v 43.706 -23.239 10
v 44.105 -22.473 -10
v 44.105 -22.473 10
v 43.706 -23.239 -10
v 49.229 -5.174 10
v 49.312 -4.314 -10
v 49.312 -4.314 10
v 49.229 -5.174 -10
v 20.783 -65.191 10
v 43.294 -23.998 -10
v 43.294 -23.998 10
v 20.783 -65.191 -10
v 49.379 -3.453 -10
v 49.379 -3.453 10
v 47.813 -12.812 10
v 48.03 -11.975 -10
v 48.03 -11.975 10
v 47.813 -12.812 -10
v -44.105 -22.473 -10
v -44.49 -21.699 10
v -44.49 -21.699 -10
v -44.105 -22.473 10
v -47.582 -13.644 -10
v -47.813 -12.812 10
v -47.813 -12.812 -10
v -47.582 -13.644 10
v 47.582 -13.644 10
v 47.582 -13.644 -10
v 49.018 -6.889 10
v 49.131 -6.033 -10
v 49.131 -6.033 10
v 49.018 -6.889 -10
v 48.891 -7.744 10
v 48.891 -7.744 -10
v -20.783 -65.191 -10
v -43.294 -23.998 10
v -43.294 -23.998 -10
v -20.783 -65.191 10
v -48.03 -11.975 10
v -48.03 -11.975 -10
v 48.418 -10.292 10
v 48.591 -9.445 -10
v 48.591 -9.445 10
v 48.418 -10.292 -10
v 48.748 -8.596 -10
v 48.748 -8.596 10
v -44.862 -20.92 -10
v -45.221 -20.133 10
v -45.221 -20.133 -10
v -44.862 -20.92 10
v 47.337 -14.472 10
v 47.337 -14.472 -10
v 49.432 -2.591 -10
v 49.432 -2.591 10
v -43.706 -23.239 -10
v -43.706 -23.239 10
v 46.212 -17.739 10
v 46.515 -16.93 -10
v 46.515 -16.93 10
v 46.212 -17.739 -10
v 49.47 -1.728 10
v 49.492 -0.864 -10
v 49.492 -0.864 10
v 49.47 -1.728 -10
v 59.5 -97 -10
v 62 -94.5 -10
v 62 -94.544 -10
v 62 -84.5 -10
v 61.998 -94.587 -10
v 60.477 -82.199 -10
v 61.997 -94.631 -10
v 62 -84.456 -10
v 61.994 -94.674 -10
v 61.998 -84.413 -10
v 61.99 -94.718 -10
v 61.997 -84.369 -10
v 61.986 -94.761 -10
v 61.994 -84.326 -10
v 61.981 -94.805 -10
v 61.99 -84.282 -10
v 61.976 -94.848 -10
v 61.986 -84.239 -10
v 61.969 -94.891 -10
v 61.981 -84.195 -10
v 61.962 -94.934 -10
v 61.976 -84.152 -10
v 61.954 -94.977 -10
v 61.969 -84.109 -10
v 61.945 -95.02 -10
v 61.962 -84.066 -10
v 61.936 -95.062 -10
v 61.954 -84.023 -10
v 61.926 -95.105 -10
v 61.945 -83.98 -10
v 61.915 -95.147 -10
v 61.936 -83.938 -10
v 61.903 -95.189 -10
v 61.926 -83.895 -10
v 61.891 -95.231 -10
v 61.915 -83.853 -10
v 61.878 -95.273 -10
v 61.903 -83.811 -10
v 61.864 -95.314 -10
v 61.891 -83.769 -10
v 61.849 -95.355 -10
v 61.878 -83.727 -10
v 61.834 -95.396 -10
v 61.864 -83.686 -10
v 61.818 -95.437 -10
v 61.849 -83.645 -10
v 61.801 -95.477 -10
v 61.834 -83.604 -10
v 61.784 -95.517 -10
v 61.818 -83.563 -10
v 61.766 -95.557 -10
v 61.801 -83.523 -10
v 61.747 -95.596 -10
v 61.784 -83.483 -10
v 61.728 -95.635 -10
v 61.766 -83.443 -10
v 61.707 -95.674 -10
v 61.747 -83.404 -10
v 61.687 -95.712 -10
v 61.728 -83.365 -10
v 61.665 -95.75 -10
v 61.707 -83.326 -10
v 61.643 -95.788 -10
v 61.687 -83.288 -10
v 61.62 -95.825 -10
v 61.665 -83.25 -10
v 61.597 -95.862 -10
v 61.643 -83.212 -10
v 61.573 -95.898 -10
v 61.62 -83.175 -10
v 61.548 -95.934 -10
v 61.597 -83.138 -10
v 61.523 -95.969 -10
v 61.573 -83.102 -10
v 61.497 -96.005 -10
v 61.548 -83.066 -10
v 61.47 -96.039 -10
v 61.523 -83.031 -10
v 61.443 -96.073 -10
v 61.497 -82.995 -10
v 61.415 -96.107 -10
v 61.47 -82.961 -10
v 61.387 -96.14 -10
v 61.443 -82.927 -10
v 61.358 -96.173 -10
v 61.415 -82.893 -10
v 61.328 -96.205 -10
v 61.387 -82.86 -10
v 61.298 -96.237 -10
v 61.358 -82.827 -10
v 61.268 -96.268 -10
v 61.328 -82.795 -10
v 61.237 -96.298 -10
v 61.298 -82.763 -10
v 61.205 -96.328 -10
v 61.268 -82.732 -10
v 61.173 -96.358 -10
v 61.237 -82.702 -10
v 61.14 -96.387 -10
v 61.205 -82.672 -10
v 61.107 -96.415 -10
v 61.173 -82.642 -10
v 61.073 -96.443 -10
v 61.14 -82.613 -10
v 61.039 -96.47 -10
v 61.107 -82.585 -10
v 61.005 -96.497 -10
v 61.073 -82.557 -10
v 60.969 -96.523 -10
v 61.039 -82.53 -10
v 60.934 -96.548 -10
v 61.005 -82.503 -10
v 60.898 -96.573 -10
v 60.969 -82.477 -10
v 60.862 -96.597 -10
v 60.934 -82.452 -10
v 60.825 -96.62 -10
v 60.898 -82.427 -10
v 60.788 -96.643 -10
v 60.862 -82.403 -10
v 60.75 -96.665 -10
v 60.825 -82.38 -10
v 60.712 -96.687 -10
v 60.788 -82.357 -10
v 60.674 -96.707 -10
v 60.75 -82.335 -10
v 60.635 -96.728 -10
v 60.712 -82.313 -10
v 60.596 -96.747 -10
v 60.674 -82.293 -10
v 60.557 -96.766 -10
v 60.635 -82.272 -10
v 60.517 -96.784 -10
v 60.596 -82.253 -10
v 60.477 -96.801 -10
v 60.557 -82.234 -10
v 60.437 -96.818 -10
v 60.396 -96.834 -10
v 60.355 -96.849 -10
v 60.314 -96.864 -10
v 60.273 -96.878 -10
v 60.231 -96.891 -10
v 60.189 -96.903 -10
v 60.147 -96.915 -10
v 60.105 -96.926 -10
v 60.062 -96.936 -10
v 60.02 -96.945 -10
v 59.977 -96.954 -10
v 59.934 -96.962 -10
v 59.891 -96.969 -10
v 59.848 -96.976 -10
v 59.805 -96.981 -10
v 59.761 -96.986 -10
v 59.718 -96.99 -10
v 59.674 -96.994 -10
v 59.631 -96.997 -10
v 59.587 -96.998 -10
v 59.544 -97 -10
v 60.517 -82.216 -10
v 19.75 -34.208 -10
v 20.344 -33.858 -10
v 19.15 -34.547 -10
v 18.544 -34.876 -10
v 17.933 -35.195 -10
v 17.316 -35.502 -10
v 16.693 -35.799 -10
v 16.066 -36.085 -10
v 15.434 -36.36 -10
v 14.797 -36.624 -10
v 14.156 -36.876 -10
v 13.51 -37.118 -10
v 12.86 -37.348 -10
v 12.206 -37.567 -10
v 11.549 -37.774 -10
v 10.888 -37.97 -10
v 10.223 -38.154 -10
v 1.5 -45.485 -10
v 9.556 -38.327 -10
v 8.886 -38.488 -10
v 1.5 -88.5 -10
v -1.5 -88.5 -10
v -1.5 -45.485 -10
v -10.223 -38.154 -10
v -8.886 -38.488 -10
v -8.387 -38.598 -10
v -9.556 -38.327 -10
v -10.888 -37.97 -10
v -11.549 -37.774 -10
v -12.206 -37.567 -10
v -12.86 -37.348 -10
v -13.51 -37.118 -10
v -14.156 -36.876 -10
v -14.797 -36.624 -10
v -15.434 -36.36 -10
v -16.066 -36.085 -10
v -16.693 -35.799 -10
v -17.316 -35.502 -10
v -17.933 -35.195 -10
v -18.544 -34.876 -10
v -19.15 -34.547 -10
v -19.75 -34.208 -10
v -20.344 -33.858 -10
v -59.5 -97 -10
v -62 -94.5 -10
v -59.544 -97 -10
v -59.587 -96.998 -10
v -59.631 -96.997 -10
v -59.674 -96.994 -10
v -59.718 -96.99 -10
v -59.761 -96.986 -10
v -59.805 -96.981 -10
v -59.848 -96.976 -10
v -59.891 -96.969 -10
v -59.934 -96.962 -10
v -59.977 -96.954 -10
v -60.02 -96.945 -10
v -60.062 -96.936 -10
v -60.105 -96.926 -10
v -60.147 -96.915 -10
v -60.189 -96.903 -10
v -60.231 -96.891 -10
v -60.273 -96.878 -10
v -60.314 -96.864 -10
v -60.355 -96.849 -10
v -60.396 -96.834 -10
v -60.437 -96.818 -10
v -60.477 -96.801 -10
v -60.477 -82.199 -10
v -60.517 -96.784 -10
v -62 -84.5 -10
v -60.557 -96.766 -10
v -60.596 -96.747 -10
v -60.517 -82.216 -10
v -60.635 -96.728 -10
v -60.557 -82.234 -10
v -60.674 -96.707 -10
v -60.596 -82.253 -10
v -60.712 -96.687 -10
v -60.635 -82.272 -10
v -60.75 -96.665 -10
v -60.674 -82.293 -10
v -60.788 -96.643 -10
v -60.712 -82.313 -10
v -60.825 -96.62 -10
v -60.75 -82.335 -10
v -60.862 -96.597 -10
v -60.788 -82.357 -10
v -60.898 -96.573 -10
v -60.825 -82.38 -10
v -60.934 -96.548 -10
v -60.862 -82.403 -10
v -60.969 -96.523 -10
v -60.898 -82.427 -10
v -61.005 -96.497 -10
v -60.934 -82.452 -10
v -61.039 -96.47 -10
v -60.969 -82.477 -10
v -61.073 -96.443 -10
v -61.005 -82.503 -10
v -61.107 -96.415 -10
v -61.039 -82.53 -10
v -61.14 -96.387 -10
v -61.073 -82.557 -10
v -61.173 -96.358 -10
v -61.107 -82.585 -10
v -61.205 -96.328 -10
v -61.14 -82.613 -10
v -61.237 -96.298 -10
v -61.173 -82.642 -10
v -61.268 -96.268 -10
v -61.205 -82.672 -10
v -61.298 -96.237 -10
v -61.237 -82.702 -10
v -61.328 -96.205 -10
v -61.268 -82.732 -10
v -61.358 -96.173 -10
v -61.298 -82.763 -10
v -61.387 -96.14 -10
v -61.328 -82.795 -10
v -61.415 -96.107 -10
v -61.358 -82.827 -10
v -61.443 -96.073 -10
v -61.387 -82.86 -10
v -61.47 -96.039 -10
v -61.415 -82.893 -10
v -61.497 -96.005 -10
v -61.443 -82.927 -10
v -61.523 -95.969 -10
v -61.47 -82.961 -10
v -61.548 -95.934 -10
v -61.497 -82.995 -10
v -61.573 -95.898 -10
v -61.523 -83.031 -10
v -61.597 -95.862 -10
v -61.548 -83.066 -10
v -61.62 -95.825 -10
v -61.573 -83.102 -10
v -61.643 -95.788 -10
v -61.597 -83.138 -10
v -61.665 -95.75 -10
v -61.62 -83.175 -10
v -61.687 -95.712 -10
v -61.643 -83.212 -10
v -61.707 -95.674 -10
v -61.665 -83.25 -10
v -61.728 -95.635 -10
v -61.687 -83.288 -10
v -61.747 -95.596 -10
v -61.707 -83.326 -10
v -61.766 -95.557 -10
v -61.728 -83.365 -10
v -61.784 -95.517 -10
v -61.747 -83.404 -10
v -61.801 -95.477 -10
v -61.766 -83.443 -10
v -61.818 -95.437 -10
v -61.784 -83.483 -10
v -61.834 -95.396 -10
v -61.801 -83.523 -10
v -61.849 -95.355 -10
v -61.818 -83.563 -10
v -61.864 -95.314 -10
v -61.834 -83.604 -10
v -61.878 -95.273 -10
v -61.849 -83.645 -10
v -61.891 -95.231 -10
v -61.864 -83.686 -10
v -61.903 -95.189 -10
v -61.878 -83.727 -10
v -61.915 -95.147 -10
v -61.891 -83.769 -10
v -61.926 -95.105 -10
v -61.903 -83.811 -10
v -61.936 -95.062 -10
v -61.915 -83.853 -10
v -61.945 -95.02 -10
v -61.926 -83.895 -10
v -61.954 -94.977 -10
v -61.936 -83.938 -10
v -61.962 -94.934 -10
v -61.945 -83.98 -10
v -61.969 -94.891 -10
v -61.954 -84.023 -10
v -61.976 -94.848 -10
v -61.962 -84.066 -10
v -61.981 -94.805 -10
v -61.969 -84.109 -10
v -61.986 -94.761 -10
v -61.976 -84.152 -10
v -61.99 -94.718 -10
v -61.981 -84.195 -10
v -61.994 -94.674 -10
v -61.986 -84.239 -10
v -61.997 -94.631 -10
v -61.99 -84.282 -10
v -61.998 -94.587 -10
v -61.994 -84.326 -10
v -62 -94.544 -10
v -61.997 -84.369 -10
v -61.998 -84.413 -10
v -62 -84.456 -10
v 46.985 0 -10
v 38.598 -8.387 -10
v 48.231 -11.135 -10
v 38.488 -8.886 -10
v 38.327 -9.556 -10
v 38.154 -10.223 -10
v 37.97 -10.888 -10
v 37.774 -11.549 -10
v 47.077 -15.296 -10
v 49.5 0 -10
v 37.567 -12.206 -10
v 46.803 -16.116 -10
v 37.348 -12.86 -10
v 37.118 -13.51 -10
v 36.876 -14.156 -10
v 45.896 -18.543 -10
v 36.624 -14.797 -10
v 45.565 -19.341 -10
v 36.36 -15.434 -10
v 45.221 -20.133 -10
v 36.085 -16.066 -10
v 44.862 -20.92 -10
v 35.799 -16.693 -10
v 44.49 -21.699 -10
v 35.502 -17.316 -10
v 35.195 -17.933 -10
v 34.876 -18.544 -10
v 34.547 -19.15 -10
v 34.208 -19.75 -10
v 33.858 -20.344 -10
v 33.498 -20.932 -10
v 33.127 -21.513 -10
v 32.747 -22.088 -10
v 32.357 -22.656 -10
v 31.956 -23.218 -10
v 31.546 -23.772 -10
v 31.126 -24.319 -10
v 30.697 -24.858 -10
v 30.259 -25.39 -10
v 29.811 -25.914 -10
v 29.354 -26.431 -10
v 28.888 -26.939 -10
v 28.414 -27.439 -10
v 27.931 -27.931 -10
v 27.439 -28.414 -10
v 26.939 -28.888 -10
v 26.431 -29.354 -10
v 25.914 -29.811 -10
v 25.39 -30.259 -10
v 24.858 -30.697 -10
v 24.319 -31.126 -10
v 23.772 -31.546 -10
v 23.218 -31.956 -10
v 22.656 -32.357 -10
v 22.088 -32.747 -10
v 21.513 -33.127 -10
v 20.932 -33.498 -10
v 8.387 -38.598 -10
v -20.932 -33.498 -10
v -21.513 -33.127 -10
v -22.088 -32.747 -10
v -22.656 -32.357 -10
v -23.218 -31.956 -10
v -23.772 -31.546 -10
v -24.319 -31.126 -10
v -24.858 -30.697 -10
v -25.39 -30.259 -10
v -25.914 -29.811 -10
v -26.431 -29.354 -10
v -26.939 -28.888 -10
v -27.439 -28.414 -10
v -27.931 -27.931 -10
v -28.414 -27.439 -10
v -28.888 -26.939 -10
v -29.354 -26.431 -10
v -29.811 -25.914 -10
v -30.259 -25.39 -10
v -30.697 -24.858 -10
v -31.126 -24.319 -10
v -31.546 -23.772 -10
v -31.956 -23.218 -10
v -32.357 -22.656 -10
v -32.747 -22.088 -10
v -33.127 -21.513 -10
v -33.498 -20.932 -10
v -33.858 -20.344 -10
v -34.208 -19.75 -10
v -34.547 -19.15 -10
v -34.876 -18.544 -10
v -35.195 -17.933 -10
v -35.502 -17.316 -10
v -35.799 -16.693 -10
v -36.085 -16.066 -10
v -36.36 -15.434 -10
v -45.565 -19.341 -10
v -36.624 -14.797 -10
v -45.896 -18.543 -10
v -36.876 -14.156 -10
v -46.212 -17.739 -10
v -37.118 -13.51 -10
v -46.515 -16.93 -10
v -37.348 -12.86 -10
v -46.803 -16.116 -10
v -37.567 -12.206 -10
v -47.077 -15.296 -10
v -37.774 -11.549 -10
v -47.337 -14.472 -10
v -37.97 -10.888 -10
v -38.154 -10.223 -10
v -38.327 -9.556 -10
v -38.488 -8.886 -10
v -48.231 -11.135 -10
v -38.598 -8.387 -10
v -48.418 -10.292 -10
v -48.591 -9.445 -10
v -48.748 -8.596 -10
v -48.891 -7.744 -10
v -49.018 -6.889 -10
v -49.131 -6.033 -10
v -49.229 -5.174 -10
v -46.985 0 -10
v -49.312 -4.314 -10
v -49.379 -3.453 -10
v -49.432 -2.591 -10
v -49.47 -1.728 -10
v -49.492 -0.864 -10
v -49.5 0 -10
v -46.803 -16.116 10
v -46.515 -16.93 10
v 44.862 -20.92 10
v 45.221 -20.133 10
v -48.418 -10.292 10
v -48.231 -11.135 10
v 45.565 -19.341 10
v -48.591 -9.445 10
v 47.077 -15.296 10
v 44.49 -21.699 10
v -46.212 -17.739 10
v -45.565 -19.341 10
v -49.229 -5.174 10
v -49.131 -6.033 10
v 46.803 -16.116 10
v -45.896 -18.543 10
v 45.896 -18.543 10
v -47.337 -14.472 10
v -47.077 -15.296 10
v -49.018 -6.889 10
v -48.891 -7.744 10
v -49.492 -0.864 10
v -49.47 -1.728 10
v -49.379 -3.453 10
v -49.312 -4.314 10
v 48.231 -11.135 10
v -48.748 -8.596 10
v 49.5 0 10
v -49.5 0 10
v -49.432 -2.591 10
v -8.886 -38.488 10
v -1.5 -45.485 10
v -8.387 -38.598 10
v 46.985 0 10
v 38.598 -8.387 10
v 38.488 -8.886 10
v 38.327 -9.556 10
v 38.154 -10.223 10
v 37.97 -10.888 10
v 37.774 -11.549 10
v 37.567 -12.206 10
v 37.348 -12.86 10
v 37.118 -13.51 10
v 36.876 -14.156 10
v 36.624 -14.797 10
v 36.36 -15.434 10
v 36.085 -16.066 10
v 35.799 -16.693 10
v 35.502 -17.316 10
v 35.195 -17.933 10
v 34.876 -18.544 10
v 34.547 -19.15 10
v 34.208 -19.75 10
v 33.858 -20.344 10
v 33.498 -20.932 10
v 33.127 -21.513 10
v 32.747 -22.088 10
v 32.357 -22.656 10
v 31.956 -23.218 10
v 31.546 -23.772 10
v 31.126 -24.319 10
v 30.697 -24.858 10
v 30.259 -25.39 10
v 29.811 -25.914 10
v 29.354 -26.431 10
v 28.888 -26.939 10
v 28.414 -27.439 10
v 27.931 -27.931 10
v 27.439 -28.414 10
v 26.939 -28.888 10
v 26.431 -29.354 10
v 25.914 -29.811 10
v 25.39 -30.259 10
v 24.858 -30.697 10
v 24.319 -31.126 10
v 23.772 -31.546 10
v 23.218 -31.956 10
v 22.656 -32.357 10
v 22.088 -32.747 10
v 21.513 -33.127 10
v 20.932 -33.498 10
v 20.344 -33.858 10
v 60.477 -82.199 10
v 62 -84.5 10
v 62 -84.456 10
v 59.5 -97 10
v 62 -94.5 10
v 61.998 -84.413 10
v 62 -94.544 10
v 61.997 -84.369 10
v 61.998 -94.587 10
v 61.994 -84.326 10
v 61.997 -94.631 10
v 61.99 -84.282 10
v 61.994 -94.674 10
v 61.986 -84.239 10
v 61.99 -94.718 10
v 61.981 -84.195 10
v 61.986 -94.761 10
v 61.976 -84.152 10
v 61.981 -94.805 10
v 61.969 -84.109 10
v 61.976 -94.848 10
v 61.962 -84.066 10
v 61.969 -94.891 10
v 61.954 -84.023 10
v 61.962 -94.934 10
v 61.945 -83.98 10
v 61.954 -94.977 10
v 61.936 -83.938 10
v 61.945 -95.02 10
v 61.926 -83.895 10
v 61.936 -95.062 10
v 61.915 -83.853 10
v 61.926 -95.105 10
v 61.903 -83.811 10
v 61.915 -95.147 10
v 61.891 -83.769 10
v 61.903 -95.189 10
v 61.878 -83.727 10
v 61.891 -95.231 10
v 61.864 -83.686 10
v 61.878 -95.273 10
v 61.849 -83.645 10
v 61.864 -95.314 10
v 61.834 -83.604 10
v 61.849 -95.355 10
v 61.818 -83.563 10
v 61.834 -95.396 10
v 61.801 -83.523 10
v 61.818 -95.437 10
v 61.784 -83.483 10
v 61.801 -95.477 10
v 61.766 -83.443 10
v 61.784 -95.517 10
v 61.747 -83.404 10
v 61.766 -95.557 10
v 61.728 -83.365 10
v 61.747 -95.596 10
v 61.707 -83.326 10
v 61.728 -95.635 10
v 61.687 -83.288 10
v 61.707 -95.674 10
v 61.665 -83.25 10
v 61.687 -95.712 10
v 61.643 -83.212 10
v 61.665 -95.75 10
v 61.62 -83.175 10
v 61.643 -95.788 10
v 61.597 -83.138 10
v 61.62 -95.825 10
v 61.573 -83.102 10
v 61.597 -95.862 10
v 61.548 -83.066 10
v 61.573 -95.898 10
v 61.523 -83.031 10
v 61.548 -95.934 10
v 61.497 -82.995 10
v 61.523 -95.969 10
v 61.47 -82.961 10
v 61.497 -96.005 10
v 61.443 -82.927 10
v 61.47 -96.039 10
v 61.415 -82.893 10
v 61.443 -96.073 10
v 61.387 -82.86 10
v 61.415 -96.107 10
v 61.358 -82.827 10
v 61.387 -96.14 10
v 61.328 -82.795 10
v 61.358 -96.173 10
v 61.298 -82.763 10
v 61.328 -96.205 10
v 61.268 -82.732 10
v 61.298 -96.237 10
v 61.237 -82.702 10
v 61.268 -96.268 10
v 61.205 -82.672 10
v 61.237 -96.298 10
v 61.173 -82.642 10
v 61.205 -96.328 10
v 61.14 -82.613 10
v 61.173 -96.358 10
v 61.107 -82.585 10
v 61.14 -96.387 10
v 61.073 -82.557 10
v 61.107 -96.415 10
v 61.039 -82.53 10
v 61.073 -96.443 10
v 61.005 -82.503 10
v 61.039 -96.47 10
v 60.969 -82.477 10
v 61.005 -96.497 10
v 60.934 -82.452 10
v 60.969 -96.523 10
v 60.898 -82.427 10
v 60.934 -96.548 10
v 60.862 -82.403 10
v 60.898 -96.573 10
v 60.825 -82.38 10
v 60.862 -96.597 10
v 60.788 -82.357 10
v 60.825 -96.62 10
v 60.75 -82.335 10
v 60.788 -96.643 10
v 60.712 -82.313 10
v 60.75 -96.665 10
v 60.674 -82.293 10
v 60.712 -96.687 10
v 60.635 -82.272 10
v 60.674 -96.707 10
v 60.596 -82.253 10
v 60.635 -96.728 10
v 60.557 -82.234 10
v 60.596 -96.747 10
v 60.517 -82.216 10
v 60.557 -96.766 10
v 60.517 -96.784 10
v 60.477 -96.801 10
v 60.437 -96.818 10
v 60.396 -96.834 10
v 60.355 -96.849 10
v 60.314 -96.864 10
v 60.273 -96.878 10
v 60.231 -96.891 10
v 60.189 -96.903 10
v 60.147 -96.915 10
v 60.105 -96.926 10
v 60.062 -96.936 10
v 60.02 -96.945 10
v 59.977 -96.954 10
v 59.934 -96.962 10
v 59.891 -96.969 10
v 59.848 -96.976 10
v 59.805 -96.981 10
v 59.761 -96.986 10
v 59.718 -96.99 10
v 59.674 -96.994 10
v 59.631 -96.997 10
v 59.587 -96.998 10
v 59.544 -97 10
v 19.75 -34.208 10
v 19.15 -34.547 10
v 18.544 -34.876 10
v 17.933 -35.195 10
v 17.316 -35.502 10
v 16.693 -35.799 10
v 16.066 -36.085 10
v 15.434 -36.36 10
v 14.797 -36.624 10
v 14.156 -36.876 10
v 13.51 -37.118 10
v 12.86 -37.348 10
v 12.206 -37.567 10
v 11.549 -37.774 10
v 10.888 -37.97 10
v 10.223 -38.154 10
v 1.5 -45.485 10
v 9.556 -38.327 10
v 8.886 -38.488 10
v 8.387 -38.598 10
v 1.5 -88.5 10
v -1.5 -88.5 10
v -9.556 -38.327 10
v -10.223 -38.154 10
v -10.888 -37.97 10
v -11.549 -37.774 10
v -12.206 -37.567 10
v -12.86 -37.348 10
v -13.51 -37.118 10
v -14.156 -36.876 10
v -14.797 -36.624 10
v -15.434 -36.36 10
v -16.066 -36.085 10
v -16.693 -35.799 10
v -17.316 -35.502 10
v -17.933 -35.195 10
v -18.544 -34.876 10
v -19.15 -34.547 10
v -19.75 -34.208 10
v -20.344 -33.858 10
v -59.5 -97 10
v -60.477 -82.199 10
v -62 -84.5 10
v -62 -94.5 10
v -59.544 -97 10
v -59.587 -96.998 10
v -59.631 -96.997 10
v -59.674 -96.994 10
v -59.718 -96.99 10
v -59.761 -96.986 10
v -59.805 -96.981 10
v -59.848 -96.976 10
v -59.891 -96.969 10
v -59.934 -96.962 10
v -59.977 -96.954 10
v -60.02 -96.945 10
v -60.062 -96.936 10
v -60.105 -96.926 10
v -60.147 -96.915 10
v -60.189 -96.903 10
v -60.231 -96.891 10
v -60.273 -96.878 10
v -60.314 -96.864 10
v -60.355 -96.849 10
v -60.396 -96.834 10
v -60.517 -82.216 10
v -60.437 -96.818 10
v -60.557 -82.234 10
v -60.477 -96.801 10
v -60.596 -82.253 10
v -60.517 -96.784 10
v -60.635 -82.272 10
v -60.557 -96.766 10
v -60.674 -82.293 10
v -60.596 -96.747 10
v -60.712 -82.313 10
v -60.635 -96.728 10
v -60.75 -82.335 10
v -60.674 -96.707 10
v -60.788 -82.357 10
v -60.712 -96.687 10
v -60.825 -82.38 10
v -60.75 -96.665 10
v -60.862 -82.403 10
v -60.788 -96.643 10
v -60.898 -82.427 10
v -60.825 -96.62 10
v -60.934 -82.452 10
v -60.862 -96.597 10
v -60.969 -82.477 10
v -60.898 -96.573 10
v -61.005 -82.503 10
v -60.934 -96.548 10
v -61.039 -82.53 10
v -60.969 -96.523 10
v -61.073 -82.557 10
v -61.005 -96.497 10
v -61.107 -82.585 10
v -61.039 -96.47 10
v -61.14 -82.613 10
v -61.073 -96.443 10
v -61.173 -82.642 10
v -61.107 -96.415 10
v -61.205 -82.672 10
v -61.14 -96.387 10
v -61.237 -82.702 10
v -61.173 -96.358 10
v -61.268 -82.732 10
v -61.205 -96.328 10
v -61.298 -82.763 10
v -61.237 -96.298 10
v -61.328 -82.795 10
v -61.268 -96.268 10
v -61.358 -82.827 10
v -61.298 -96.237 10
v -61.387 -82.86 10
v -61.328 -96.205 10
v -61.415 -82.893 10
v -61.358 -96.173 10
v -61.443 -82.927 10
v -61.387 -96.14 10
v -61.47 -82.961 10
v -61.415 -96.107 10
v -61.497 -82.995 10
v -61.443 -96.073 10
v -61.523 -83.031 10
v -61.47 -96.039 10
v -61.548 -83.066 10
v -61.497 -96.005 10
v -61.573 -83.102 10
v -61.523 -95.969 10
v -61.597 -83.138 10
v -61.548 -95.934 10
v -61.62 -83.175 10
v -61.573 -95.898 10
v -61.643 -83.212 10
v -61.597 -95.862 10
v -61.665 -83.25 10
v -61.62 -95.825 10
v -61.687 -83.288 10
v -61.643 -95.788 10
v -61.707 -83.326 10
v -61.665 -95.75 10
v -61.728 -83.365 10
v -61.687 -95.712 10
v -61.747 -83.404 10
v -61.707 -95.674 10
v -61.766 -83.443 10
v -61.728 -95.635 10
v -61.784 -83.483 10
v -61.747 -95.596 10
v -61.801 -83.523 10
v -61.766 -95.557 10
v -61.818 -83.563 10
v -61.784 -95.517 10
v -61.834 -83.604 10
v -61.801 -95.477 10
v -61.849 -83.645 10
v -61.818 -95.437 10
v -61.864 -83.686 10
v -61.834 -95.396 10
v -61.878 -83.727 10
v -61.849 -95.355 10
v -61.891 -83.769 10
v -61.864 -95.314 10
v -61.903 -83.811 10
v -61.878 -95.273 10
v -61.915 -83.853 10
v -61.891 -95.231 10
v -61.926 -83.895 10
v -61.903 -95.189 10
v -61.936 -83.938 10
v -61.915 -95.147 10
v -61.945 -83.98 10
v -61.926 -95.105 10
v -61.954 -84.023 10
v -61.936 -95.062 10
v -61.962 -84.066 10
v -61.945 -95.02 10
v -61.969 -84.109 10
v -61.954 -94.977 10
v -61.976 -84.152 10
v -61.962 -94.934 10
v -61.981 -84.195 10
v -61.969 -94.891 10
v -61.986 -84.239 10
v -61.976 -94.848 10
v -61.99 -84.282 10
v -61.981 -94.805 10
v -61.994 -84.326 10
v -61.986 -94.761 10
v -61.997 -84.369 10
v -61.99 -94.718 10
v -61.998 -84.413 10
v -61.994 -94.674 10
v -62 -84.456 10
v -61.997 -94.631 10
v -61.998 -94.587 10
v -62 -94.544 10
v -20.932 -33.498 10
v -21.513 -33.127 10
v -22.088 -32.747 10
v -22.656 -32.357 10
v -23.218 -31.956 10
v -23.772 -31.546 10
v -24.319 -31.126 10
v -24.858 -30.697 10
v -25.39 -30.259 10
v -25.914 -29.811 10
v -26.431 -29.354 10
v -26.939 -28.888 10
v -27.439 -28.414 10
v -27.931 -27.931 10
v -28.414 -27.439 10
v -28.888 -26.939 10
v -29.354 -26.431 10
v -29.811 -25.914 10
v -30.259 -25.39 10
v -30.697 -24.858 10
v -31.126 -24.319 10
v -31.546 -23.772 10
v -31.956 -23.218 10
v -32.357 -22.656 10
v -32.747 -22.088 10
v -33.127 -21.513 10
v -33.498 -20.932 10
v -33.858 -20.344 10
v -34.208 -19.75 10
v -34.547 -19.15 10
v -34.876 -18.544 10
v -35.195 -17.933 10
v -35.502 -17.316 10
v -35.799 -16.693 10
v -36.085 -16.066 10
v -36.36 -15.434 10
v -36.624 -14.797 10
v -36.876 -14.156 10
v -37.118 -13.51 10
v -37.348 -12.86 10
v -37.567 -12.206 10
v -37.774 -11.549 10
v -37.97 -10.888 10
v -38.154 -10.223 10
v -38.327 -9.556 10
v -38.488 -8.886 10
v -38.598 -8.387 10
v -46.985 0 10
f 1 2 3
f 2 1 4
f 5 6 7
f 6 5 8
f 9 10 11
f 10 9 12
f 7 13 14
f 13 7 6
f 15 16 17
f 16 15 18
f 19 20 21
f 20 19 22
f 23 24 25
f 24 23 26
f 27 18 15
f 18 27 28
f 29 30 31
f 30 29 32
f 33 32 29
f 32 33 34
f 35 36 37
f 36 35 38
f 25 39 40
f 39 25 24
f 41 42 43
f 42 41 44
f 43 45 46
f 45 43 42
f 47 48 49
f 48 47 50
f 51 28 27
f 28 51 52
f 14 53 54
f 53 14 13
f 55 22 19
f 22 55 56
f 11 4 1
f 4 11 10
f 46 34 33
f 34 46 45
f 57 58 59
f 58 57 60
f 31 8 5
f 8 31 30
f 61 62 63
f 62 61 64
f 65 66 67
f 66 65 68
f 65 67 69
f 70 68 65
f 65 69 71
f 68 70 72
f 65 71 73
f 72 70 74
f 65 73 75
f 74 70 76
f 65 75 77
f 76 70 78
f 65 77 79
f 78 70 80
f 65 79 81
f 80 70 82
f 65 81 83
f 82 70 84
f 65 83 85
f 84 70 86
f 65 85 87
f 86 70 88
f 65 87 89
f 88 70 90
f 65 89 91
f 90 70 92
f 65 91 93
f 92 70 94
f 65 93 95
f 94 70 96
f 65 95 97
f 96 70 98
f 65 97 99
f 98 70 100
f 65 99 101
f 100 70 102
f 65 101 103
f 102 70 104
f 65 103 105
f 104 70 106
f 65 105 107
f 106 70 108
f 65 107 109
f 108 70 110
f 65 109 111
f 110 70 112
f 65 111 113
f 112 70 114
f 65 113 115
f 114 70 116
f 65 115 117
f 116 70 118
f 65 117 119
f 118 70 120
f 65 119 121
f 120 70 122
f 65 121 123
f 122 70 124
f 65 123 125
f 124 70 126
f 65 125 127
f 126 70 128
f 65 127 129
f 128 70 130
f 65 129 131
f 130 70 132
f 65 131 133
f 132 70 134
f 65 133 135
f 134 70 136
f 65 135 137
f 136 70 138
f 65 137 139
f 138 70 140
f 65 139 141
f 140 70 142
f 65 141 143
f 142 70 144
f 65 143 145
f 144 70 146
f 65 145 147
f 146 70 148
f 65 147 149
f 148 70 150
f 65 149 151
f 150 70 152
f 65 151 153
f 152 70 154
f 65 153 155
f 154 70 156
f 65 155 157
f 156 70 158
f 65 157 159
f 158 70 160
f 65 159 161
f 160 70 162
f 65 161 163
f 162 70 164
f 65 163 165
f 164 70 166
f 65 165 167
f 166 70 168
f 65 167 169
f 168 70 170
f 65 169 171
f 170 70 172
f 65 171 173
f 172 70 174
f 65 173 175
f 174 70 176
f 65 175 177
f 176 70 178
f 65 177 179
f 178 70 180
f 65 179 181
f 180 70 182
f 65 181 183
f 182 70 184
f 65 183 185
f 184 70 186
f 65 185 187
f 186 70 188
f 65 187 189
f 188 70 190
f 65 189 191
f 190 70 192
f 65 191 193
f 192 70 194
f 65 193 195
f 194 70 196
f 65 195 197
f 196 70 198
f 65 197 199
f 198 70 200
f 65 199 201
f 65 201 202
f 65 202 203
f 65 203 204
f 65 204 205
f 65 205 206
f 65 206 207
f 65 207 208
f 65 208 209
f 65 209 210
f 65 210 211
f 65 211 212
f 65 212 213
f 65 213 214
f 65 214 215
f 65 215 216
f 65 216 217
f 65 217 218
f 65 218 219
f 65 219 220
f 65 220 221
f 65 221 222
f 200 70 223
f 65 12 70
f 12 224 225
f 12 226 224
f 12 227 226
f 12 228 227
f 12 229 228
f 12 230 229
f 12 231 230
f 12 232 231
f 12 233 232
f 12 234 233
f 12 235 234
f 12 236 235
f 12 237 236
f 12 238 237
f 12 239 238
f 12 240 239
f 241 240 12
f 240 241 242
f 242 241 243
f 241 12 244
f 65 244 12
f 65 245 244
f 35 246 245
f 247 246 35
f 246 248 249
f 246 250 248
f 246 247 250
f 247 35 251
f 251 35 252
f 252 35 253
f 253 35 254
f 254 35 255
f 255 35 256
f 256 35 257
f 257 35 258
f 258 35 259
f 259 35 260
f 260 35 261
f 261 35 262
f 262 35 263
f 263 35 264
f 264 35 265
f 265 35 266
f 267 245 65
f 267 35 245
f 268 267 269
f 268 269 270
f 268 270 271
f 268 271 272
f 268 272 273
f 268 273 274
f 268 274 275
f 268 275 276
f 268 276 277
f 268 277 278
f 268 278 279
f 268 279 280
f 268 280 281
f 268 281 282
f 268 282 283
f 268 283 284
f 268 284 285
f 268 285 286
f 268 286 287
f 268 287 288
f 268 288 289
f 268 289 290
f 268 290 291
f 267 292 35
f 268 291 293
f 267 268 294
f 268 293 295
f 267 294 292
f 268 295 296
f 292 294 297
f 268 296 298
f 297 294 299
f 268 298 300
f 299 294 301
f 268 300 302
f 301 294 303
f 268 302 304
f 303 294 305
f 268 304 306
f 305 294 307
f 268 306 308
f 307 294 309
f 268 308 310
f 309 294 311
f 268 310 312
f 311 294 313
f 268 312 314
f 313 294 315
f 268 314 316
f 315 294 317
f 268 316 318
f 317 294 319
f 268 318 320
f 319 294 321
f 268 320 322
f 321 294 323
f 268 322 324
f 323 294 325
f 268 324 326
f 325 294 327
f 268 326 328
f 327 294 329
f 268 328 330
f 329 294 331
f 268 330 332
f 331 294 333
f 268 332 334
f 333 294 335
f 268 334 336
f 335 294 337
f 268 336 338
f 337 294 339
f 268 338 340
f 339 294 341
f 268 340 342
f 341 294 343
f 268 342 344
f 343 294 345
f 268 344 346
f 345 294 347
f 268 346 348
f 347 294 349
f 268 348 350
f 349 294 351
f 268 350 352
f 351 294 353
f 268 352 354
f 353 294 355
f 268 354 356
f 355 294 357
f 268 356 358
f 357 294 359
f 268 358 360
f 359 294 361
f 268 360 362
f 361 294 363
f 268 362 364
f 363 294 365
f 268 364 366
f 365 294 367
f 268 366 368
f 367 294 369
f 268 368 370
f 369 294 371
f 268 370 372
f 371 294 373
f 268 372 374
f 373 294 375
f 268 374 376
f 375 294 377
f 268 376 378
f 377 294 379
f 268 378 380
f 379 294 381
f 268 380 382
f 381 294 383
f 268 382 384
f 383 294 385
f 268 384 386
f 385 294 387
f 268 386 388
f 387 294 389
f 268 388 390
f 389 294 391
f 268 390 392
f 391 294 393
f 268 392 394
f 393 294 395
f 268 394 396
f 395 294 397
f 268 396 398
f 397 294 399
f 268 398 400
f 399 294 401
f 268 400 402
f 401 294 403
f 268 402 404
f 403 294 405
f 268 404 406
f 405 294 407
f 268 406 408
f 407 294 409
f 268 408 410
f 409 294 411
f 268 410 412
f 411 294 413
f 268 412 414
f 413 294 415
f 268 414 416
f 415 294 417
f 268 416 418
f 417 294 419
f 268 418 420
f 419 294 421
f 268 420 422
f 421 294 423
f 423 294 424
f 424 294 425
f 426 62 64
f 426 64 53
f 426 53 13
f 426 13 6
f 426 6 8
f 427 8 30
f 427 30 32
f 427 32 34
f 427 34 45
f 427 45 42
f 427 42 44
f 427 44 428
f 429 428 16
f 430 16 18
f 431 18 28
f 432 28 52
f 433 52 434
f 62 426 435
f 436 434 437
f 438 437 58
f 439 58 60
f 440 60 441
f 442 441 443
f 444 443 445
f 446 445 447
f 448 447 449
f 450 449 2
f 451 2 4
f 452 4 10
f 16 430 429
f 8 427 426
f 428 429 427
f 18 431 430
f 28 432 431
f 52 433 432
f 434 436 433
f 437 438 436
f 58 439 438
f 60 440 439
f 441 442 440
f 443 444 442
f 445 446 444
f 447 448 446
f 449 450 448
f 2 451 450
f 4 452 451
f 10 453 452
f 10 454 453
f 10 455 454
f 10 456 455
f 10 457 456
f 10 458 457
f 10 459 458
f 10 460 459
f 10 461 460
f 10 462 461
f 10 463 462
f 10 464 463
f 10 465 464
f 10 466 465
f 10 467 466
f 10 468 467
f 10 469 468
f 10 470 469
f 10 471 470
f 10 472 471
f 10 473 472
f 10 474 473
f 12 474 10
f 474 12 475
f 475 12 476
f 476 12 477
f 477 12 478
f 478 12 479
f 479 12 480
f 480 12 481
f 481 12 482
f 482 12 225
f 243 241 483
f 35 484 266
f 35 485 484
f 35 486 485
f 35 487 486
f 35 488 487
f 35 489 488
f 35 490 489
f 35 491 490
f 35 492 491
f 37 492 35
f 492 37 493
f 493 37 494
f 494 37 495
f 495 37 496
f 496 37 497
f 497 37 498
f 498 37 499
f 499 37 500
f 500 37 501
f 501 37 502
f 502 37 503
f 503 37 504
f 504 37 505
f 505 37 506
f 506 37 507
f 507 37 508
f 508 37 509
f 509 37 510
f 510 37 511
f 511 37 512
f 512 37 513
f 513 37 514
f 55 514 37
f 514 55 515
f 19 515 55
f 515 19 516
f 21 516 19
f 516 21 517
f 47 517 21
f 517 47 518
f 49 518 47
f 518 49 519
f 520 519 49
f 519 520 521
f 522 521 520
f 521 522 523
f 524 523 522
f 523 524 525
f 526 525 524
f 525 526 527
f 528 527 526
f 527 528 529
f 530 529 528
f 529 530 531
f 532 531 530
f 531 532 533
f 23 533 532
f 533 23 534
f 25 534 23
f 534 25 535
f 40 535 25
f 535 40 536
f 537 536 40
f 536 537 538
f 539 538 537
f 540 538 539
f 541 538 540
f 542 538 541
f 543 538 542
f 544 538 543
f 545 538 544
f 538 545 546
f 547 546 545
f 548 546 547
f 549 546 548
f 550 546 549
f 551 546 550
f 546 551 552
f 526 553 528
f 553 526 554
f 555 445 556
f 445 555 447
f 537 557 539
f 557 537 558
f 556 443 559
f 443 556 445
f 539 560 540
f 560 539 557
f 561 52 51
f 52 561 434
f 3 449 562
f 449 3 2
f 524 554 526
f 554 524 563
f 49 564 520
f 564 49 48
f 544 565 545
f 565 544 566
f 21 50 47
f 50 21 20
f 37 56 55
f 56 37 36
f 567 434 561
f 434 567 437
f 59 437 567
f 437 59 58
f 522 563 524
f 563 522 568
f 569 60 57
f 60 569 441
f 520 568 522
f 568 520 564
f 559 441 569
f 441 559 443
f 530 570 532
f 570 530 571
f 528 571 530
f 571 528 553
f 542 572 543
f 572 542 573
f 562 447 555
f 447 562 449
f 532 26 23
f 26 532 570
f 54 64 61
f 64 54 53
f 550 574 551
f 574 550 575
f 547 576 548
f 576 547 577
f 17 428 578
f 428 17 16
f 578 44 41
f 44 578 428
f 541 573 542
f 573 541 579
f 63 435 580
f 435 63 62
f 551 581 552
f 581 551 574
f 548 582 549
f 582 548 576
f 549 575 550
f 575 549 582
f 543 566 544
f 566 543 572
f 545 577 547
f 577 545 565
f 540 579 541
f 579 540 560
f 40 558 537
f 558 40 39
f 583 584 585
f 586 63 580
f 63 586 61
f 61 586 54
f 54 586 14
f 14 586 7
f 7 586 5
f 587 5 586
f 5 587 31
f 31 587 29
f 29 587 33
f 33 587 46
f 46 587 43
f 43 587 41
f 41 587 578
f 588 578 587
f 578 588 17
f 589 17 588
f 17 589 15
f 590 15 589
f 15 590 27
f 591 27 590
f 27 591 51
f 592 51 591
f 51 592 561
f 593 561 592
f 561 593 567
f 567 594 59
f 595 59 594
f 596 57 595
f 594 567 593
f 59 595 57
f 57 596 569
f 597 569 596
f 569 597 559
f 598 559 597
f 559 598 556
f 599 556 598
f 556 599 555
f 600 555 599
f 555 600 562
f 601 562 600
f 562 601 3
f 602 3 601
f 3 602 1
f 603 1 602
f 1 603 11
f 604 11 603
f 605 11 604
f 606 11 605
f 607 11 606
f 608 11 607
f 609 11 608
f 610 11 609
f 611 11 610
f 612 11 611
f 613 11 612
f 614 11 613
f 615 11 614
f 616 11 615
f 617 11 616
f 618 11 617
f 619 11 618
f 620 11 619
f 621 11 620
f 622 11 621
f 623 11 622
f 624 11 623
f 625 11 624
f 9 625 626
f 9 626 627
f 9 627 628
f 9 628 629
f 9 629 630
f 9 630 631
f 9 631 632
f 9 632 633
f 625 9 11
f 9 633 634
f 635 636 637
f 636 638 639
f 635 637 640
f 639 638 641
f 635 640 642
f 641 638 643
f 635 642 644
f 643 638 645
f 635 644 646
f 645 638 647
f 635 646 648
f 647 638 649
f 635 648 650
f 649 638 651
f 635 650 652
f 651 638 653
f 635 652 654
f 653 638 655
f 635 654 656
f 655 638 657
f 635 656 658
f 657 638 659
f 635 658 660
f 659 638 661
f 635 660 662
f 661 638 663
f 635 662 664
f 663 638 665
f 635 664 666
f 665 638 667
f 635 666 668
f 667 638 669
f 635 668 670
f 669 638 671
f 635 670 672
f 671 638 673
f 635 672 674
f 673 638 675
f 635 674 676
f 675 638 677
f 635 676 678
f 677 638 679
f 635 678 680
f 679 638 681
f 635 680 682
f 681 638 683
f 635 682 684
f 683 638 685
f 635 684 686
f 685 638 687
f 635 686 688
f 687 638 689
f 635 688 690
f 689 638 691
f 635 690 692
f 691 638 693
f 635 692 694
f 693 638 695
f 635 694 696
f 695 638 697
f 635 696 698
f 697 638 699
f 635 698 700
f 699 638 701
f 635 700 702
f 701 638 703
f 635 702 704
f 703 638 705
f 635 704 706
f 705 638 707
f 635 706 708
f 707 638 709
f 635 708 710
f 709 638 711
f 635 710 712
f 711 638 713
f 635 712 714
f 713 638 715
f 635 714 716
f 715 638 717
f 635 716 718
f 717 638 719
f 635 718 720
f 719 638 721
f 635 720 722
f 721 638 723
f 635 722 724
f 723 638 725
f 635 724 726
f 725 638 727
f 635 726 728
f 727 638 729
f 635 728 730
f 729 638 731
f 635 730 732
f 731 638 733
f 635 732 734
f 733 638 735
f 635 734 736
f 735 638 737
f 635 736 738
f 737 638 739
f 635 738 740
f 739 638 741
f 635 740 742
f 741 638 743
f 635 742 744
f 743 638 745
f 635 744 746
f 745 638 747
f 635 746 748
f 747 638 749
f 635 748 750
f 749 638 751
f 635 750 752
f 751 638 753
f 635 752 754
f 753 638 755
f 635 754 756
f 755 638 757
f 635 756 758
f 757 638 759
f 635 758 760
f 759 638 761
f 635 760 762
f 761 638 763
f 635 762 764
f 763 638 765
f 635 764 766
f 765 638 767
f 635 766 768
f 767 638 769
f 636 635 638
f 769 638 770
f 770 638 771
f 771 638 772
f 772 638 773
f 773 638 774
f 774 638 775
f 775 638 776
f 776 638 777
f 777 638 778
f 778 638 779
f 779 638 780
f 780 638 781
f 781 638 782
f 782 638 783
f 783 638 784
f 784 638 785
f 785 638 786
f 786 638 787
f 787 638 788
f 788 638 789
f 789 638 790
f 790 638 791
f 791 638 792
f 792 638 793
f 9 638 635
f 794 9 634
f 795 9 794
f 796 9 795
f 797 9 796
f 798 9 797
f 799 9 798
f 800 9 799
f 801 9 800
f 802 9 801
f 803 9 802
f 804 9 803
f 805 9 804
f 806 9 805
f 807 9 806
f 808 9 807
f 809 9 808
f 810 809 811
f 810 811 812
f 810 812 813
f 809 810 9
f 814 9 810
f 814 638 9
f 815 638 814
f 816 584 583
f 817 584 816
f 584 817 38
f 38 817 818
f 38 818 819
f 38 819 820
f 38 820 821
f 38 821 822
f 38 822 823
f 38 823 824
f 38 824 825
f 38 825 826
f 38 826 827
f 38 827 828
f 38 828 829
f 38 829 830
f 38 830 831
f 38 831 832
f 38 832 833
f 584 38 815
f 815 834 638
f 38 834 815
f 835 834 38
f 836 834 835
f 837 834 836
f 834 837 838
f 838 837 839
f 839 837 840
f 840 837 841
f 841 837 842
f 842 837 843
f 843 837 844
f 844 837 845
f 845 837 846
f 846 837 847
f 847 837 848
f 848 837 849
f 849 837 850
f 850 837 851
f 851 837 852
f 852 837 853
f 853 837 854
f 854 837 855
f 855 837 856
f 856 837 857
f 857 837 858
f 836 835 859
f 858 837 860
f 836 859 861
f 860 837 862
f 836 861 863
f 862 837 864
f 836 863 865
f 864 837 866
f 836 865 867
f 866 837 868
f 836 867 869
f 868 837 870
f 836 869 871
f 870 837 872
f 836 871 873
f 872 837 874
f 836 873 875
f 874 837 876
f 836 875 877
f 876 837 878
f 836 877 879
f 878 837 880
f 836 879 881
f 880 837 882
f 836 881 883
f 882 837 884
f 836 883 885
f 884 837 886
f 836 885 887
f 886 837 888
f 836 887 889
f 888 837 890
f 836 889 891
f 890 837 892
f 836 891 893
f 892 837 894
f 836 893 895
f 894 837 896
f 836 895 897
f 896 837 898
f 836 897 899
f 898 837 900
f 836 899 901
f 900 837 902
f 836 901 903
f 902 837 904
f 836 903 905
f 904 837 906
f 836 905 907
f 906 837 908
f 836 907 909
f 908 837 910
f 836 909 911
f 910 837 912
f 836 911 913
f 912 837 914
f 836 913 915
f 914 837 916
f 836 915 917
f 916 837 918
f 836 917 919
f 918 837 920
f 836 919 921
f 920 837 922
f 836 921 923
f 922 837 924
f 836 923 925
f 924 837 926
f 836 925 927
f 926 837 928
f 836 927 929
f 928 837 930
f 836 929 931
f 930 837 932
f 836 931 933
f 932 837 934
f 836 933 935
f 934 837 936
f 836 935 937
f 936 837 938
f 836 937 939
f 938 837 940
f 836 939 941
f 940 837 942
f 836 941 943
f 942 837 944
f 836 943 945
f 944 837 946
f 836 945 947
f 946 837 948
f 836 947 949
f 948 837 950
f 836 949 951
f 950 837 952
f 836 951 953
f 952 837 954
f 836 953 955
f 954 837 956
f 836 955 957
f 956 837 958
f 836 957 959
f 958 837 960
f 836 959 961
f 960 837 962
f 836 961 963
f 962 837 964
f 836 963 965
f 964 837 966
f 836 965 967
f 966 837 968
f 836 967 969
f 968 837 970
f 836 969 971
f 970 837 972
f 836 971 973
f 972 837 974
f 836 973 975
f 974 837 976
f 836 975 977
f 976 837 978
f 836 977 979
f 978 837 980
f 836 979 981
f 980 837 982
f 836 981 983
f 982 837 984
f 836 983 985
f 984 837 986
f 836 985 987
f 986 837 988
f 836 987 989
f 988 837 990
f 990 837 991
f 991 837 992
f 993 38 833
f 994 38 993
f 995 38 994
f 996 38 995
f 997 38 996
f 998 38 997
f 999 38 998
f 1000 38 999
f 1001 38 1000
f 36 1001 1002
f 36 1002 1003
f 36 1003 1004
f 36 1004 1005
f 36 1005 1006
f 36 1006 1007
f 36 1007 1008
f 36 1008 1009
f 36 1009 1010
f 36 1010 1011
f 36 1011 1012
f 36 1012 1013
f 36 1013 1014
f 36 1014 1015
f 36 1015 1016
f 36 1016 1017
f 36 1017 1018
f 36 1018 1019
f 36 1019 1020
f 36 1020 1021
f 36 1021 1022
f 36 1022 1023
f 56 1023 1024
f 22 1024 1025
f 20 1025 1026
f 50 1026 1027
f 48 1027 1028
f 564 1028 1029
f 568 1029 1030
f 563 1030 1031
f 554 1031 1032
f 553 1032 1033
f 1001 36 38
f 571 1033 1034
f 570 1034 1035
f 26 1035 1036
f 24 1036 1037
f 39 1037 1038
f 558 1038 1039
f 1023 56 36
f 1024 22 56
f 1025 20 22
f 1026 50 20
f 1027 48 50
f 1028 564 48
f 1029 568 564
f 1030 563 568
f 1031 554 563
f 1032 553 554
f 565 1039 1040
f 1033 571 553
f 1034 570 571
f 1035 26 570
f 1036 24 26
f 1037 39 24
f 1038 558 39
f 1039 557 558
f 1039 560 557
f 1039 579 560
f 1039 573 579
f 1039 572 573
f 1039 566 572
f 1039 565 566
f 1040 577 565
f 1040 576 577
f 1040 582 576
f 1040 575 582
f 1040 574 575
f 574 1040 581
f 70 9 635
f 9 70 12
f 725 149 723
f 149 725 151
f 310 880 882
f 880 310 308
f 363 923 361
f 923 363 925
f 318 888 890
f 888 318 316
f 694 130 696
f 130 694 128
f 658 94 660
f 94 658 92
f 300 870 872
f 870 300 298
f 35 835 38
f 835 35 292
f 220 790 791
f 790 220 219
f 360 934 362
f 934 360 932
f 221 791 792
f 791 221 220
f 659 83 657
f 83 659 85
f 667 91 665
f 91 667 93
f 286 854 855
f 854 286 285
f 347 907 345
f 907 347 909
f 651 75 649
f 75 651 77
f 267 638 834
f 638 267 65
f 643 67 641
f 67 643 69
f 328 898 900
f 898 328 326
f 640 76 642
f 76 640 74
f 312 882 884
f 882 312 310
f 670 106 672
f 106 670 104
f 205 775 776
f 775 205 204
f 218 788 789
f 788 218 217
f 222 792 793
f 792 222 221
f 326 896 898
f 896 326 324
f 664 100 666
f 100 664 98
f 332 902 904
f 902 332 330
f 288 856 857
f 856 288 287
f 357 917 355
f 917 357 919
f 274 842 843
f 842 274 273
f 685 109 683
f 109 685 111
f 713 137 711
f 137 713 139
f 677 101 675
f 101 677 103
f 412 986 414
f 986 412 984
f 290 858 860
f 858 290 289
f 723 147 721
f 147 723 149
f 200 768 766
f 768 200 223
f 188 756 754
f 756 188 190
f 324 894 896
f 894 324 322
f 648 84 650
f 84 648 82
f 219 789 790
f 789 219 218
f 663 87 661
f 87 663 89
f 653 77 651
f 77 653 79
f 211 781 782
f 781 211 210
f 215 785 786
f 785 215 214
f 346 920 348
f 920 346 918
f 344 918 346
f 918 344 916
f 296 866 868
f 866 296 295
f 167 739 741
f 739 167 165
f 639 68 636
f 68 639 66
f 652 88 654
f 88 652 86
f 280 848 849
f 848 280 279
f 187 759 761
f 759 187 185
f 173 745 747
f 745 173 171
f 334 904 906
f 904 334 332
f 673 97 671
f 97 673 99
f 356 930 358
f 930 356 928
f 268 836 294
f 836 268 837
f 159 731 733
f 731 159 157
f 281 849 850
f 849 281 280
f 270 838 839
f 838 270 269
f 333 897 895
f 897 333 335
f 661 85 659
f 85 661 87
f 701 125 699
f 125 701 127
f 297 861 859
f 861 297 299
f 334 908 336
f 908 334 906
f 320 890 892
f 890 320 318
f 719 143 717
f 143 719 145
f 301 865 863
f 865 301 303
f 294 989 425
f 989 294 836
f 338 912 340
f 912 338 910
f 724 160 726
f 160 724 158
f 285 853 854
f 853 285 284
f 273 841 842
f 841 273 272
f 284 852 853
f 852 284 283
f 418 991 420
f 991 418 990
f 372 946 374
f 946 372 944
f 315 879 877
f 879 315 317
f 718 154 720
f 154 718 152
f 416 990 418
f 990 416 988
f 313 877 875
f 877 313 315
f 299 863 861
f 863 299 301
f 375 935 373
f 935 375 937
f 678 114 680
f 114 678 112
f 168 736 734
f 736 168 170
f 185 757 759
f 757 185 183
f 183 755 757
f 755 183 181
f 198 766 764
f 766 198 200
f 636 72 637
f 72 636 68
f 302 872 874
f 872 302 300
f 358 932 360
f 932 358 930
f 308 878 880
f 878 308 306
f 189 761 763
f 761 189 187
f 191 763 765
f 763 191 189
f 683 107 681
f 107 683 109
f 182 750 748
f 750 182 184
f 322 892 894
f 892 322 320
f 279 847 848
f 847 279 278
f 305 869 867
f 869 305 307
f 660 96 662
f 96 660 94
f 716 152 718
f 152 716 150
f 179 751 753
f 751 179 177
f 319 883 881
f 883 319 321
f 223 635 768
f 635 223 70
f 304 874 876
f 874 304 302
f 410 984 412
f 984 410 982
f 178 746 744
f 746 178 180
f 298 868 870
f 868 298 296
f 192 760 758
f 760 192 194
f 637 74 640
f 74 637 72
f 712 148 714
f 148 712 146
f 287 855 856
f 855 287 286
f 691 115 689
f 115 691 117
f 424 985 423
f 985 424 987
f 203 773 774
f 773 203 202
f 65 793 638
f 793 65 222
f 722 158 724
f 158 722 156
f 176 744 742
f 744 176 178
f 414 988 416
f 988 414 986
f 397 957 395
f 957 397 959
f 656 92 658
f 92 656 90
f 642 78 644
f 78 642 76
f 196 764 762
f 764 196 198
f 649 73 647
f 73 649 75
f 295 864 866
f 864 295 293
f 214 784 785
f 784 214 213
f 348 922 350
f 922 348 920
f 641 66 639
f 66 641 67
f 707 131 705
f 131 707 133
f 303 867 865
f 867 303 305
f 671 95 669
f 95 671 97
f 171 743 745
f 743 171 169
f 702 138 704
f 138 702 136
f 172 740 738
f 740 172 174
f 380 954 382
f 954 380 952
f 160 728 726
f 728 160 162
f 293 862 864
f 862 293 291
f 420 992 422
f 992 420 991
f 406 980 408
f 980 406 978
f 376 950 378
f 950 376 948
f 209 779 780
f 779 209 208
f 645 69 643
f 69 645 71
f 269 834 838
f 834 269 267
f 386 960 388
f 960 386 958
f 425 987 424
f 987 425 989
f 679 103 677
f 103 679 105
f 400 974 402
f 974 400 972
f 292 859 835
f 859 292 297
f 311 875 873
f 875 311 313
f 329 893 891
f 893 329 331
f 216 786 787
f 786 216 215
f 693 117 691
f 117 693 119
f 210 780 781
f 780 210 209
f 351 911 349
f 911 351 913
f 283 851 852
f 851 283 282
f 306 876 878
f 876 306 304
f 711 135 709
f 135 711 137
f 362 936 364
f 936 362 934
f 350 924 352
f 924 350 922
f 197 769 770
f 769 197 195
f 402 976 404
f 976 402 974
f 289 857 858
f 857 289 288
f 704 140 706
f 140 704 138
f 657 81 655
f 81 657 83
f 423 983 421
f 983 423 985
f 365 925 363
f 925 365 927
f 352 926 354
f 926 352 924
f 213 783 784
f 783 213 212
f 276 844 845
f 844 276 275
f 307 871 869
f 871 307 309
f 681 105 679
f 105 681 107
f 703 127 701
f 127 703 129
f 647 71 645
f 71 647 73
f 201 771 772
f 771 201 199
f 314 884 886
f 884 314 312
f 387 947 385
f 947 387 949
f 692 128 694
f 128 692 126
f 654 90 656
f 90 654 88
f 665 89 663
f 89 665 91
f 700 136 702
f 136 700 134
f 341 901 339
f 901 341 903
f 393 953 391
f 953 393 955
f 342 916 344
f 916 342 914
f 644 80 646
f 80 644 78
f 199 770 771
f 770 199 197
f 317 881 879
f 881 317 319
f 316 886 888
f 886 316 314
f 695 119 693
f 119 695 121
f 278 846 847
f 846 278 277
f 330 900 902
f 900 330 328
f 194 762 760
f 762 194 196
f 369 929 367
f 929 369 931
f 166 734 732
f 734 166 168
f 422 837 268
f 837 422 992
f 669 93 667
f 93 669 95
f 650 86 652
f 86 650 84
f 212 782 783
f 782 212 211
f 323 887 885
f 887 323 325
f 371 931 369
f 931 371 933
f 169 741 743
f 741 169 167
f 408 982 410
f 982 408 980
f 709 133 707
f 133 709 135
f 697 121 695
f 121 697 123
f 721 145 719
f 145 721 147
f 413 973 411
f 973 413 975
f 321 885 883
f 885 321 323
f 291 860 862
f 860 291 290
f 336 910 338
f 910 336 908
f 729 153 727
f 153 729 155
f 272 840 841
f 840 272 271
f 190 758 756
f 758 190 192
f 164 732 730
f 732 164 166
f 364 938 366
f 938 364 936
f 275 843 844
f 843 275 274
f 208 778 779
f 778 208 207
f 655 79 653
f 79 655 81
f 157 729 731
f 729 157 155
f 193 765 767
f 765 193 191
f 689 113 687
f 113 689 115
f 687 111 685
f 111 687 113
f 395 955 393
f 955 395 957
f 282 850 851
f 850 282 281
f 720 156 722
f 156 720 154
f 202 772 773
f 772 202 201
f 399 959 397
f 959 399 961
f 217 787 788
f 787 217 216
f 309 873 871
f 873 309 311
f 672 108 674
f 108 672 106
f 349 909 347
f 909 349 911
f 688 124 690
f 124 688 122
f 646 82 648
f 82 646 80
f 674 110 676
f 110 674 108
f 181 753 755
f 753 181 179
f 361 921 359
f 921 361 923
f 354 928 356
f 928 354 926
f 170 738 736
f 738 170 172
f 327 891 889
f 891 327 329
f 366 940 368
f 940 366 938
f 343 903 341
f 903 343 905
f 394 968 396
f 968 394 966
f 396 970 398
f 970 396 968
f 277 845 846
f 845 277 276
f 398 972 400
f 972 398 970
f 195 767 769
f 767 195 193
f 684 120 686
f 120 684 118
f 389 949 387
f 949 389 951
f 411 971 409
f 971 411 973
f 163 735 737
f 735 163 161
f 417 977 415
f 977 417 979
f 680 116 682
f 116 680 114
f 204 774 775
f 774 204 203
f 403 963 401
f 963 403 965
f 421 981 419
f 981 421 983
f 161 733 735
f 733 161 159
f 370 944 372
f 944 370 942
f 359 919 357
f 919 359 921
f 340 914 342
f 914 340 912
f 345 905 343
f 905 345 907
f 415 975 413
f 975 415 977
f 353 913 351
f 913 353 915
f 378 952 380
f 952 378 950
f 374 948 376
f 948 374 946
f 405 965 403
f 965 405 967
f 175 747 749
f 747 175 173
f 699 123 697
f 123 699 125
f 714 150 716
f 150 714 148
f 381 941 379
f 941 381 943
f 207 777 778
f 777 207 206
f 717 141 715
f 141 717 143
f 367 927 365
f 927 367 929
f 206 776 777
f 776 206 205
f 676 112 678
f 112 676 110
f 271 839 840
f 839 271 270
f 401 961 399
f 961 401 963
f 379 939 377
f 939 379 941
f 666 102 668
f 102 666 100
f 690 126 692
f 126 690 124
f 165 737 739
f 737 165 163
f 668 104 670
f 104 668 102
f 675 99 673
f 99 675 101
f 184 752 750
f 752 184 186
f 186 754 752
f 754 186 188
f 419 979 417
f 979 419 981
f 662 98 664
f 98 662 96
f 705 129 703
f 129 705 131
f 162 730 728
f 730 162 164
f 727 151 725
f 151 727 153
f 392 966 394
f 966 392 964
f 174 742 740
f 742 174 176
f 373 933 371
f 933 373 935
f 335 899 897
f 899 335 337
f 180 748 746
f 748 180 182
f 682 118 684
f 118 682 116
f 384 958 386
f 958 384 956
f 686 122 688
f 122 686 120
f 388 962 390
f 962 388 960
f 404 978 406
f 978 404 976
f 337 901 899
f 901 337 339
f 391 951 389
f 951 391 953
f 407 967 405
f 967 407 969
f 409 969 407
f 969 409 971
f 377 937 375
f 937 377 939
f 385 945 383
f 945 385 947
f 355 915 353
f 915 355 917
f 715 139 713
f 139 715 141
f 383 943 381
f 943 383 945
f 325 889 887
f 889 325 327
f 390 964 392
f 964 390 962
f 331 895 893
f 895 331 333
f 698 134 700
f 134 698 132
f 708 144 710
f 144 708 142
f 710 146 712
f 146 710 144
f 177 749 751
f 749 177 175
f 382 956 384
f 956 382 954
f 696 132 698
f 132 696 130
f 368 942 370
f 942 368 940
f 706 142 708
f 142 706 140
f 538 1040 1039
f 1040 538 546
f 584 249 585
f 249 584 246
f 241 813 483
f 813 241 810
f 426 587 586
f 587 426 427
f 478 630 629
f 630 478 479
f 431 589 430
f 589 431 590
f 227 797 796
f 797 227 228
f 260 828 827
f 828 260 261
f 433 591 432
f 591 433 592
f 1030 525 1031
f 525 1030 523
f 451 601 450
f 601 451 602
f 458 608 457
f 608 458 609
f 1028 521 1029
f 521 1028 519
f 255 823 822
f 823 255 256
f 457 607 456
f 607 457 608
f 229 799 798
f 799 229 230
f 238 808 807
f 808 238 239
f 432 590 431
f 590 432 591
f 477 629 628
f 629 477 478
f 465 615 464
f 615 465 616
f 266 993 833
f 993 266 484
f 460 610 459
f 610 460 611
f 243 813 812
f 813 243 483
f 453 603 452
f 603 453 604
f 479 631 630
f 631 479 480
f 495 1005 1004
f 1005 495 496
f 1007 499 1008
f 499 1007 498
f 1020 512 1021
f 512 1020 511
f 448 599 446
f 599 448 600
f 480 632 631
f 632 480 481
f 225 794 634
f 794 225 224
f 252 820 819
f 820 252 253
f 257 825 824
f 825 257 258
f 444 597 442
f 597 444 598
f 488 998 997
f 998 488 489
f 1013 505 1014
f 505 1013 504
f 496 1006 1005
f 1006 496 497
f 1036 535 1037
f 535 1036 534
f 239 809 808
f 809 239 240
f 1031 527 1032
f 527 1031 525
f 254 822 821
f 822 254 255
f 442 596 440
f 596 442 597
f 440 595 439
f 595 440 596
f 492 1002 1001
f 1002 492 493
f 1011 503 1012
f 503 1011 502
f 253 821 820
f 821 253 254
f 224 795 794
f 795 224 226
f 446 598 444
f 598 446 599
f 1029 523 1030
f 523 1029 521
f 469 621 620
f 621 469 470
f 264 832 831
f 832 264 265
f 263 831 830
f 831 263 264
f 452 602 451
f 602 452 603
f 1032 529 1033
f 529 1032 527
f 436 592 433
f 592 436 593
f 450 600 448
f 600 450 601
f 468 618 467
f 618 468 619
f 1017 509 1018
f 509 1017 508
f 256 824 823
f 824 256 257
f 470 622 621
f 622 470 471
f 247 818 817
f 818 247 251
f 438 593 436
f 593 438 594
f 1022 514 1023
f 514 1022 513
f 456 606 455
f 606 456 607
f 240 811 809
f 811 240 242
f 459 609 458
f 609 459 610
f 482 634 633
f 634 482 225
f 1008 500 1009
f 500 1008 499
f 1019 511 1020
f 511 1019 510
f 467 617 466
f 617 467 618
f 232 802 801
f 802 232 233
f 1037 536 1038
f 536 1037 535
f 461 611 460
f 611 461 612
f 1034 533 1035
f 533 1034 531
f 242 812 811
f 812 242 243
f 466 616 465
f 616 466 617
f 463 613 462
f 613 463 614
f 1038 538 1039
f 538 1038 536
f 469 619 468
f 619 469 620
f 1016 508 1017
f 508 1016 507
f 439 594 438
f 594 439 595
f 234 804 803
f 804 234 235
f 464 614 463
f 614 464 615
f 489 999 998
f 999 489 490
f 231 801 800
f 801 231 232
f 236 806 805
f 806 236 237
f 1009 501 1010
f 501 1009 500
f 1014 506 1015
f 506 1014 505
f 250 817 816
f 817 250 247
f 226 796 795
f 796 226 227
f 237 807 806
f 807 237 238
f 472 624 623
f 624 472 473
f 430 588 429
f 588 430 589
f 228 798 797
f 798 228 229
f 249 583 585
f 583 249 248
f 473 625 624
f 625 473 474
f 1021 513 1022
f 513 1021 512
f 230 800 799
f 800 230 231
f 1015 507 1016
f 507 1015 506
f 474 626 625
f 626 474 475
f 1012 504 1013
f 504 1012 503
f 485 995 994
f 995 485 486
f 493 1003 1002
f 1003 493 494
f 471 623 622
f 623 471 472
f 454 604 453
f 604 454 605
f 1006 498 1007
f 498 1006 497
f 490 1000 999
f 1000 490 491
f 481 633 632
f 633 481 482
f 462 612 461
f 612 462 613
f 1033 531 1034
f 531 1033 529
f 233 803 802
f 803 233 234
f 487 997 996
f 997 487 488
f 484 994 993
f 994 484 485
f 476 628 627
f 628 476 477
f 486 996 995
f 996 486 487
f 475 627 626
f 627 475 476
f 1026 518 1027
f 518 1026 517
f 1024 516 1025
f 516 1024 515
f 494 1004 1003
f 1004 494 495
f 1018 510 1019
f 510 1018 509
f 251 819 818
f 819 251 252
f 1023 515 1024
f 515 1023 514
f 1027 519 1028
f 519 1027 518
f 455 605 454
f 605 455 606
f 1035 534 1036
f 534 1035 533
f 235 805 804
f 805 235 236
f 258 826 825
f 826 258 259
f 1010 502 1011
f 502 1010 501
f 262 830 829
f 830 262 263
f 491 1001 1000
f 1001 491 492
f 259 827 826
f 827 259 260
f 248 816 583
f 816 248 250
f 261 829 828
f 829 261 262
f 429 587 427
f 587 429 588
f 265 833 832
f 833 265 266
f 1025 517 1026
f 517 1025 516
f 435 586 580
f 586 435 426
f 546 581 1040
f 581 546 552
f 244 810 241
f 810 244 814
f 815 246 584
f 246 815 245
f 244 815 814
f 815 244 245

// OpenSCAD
$fn=360;
//$fn=60;

dia=79;
thickness=20;
height=50;
difference(){
  union(){
    hull(){
      cylinder(d=dia+20,h=thickness,center=true);
      translate([0,-dia/2-height/2,0])
      cube([15,height,thickness],center=true);
    }
    translate([0,-height-dia/2,0]) hull(){
      for(X=[-1,1], Y=[-1,1])
        translate([(dia/2+20)*X,5*Y,0]) cylinder(d=5,h=thickness,center=true);
      translate([0,15,0]) cube([15,30,thickness],center=true);
    }
  }
  cylinder(d=dia,h=thickness+1,center=true);
  translate([0,dia/2,0]) cube([dia+21,dia,thickness+1],center=true);
  translate([0,1-dia/2-height/2,0])
    cube([3,height,thickness+1],center=true);
  for(R=[-90,0,90]) rotate([0,0,R])
    translate([0,1-dia/2,0]) rotate([0,0,45])
      cube([12,12,thickness+1],center=true);
}


module vertical_stand(motor_dia=37.5, mount_length=50){
  cylinder(d=motor_dia,h=mount_length+20);
  cylinder(d=motor_dia+20,h=20);
  translate([0,0,3]) rotate_extrude(angle=360) 
  translate([100,0,0]) hull(){
    circle(d=5);
    translate([0,-2.5,0]) square([5,1],center=true);
  }
  for(R=[0:360/6:360]) rotate([0,0,R])
    hull(){
      translate([0,100,2.5]) cube([10,1,5],center=true);
      translate([0,motor_dia/2,5]) cube([10,1,10],center=true);
    }
}
